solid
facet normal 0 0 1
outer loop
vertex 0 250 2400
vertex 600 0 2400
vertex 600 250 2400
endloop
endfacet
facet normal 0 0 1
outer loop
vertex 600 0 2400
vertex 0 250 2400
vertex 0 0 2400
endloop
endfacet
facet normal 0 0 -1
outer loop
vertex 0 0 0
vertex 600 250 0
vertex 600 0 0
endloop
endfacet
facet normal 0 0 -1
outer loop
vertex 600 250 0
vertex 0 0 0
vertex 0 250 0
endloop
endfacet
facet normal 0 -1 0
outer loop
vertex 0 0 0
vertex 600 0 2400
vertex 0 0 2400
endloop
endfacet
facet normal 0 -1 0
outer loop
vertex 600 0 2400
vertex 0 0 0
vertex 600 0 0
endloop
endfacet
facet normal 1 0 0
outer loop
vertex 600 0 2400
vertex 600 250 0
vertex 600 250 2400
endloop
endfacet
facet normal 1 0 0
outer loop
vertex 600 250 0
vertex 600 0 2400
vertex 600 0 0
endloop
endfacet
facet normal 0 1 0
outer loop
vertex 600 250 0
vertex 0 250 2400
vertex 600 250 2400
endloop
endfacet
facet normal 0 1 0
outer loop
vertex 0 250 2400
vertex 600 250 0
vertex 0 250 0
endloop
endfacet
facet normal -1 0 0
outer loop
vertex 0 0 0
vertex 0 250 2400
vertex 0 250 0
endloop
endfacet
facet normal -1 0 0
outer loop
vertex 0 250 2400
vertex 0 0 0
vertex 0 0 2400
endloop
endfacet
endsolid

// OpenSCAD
// file: tea_shop_parameters.scad
// =============================================================================
// Tea Shop — SHARED PARAMETERS (Base & Shell)
// -----------------------------------------------------------------------------
// OpenSCAD's native unit is 1 mm, so every value here is the REAL-LIFE size
// in millimetres (1000 mm = 1 m). E.g. building_width = 6000 means 6.0 m.
//
// For MLO / FiveM (which uses metres as 1 unit = 1 m), either:
//   (a) export each STL here and re-import at a scale of 0.001 (mm -> m), or
//   (b) model in metres directly by dividing every value below by 1000.
//
// Tune each value here; every module pulls its size from these variables.
// =============================================================================


// --- building shell / roof (lean-to: TALL back, SHORT front eave) -----------
wall_thickness    = 250;   // wall panel thickness                      (0.25 m)
building_width    = 6000;  // X extent, left wall -> right wall          (6.00 m)
building_depth    = 4000;  // Y extent, front eave -> back wall          (4.00 m)
back_height       = 3200;  // full wall height at the BACK (tall side)   (3.20 m)
front_eave_height = 2400;  // wall height at the FRONT eave (short side) (2.40 m)

// --- front wall openings (service window + door), measured along X ----------
left_pier_width   = 600;   // solid pier left of the service window      (0.60 m)
window_width      = 3400;  // service window opening width — made WIDE   (3.40 m)
mid_pier_width    = 500;   // solid pier between window and door         (0.50 m)
door_width        = 1000;  // door opening width                         (1.00 m)
sill_height       = 900;   // knee-wall (sill) height beneath the window (0.90 m)

// --- base slab / plinth ------------------------------------------------------
base_thickness    = 200;   // vertical thickness of the ground plinth    (0.20 m)
base_side_margin  = 900;   // slab overhang beyond left/right walls      (0.90 m)
base_back_margin  = 600;   // slab overhang behind the back wall         (0.60 m)
base_front_margin = 3000;  // extra slab in FRONT = porch/patio (pergola)(3.00 m)


// -----------------------------------------------------------------------------
// DERIVED DIMENSIONS (do not edit — computed from the values above)
// -----------------------------------------------------------------------------

// front-wall pier chain, left -> right, must sum exactly to building_width
window_left      = left_pier_width;                    // X where the window starts
window_right     = window_left + window_width;         // X where the window ends
door_left        = window_right + mid_pier_width;      // X where the door starts
door_right       = door_left + door_width;             // X where the door ends
right_pier_width = building_width - door_right;        // fills the rest to the corner

// window opening rises from the top of the sill up to the front eave line
window_open_height = front_eave_height - sill_height;
// file: tea_shop_modules.scad
// =============================================================================
// Tea Shop — MODULE LIBRARY (Base & Shell)
// -----------------------------------------------------------------------------
// This file only DEFINES the parts (and the assemble() preview). It instantiates
// NO geometry on its own, so it can be include'd by the individual export files
// (part_*.scad) and by tea_shop_assemble.scad without producing duplicates.
//
// GLOBAL COORDINATE SYSTEM (shared by every piece — no per-part centering):
//   +X -> left -> right  (building WIDTH along X, left wall at X=0)
//   +Y -> front -> back  (building DEPTH along Y, front eave at Y=0)
//   +Z -> up             (ground/porch surface = Z=0)
//
//   Building footprint = [0..building_width] x [0..building_depth].
//   Roof = single-pitch lean-to: TALL at BACK (Y=depth), SHORT at FRONT (Y=0).
// =============================================================================

include <tea_shop_parameters.scad>;


// -----------------------------------------------------------------------------
// _trapezoid_prism — shared core for the two side walls. It draws the side
// elevation (depth x height) as a 2D polygon, then linear_extrude +
// rotate([0,-90,0]) stand it up so its thickness runs along X. The front edge
// (Y=0) is the short eave height and the back edge (Y=depth) is the full back
// height, so the top edge automatically matches the roof pitch. Result
// occupies X = [0 .. wall_thickness].
// -----------------------------------------------------------------------------
module _trapezoid_prism() {
    translate([wall_thickness, 0, 0])
        rotate([0, -90, 0])
            linear_extrude(height = wall_thickness)
                polygon(points = [
                    [0,                 0],               // front, ground
                    [0,                 building_depth],  // back,  ground
                    [back_height,       building_depth],  // back,  top (tall)
                    [front_eave_height, 0]                // front, top (eave)
                ]);
}


// =============================================================================
// base_slab — flat ground plinth. Extends past the building on all sides, with
// a generous margin up front to form the porch/patio where the bench / stools
// sit under the pergola. Top surface is the datum Z=0.
// =============================================================================
module base_slab() {
    translate([-base_side_margin, -base_front_margin, -base_thickness])
        cube([
            building_width + 2 * base_side_margin,                 // X
            building_depth + base_front_margin + base_back_margin, // Y
            base_thickness                                          // Z
        ]);
}


// =============================================================================
// back_wall — solid rectangular panel, full building width and FULL height
// (the tall side of the lean-to). Sits at the back edge of the footprint.
// =============================================================================
module back_wall() {
    translate([0, building_depth - wall_thickness, 0])
        cube([building_width, wall_thickness, back_height]);
}


// =============================================================================
// left_side_wall — trapezoidal panel, TALL at the back edge and SHORT at the
// front edge, matching the roof slope. Occupies X = [0 .. wall_thickness].
// =============================================================================
module left_side_wall() {
    _trapezoid_prism();
}


// =============================================================================
// right_side_wall — mirror image of the left wall (identical trapezoid cross
// section, since both walls slope down toward the FRONT eave), placed at the
// right edge X = [building_width - wall_thickness .. building_width].
// Plain — no openings.
// =============================================================================
module right_side_wall() {
    translate([building_width - wall_thickness, 0, 0])
        _trapezoid_prism();
}


// =============================================================================
// FRONT WALL — broken into solid piers + a knee-wall (sill), leaving a service
// window opening and a door opening. Every front piece tops out at the front
// eave height (the horizontal line where the roof meets the front wall).
//
//   |<- left ->|<--- window --->|<- mid ->|<-- door -->|<- right ->|
//   |   pier   |    (opening)   |   pier  |  (opening)  |   pier   |
//   |          |   [sill below] |         |             |          |
// =============================================================================

// front_wall_left_pier — solid pier left of the service window, ground to eave.
module front_wall_left_pier() {
    translate([0, 0, 0])
        cube([left_pier_width, wall_thickness, front_eave_height]);
}


// front_wall_sill — the low knee-wall beneath the service window opening.
// The window opening sits above it.
// TODO: counter + window frame modules slot in above this sill (later group).
module front_wall_sill() {
    translate([window_left, 0, 0])
        cube([window_width, wall_thickness, sill_height]);
}


// front_wall_mid_pier — solid pier between the window and the door, full height.
module front_wall_mid_pier() {
    translate([window_right, 0, 0])
        cube([mid_pier_width, wall_thickness, front_eave_height]);
}


// front_wall_right_pier — solid pier right of the door, out to the front corner.
// Width is derived so the pier chain always ends flush with the right corner.
module front_wall_right_pier() {
    translate([door_right, 0, 0])
        cube([right_pier_width, wall_thickness, front_eave_height]);
}


// -----------------------------------------------------------------------------
// OPENING ANNOTATIONS (for reference — these are EMPTY volumes in the shell):
//
//   Service window opening:
//     X = [window_left .. window_right], Z = [sill_height .. front_eave_height]
//     TODO: window frame + service counter modules slot in here (later group).
//
//   Door opening:
//     X = [door_left .. door_right], Z = [0 .. front_eave_height] (full height)
//     TODO: door / door-frame module slots in here (later group).
// -----------------------------------------------------------------------------


// =============================================================================
// assemble — visual verification ONLY (not for export). Shows every piece in
// the shared coordinate system, each in its own colour, so the assembled shell
// can be checked against the reference before exporting individual STLs.
// =============================================================================
module assemble() {
    color("LightGray")  base_slab();

    color("SkyBlue")    back_wall();
    color("Orange")     left_side_wall();
    color("Orange")     right_side_wall();

    color("FireBrick")  front_wall_left_pier();
    color("Peru")       front_wall_sill();
    color("FireBrick")  front_wall_mid_pier();
    color("FireBrick")  front_wall_right_pier();
}
// main file
// =============================================================================
// part_front_wall_left_pier.scad — export the FRONT WALL LEFT PIER only.
// Open this file, press F6 (render), then export as STL. Everything sits in the
// shared global coordinate system, so re-importing all parts together lines up
// automatically with no manual repositioning.
// =============================================================================

include <tea_shop_modules.scad>;

front_wall_left_pier();
